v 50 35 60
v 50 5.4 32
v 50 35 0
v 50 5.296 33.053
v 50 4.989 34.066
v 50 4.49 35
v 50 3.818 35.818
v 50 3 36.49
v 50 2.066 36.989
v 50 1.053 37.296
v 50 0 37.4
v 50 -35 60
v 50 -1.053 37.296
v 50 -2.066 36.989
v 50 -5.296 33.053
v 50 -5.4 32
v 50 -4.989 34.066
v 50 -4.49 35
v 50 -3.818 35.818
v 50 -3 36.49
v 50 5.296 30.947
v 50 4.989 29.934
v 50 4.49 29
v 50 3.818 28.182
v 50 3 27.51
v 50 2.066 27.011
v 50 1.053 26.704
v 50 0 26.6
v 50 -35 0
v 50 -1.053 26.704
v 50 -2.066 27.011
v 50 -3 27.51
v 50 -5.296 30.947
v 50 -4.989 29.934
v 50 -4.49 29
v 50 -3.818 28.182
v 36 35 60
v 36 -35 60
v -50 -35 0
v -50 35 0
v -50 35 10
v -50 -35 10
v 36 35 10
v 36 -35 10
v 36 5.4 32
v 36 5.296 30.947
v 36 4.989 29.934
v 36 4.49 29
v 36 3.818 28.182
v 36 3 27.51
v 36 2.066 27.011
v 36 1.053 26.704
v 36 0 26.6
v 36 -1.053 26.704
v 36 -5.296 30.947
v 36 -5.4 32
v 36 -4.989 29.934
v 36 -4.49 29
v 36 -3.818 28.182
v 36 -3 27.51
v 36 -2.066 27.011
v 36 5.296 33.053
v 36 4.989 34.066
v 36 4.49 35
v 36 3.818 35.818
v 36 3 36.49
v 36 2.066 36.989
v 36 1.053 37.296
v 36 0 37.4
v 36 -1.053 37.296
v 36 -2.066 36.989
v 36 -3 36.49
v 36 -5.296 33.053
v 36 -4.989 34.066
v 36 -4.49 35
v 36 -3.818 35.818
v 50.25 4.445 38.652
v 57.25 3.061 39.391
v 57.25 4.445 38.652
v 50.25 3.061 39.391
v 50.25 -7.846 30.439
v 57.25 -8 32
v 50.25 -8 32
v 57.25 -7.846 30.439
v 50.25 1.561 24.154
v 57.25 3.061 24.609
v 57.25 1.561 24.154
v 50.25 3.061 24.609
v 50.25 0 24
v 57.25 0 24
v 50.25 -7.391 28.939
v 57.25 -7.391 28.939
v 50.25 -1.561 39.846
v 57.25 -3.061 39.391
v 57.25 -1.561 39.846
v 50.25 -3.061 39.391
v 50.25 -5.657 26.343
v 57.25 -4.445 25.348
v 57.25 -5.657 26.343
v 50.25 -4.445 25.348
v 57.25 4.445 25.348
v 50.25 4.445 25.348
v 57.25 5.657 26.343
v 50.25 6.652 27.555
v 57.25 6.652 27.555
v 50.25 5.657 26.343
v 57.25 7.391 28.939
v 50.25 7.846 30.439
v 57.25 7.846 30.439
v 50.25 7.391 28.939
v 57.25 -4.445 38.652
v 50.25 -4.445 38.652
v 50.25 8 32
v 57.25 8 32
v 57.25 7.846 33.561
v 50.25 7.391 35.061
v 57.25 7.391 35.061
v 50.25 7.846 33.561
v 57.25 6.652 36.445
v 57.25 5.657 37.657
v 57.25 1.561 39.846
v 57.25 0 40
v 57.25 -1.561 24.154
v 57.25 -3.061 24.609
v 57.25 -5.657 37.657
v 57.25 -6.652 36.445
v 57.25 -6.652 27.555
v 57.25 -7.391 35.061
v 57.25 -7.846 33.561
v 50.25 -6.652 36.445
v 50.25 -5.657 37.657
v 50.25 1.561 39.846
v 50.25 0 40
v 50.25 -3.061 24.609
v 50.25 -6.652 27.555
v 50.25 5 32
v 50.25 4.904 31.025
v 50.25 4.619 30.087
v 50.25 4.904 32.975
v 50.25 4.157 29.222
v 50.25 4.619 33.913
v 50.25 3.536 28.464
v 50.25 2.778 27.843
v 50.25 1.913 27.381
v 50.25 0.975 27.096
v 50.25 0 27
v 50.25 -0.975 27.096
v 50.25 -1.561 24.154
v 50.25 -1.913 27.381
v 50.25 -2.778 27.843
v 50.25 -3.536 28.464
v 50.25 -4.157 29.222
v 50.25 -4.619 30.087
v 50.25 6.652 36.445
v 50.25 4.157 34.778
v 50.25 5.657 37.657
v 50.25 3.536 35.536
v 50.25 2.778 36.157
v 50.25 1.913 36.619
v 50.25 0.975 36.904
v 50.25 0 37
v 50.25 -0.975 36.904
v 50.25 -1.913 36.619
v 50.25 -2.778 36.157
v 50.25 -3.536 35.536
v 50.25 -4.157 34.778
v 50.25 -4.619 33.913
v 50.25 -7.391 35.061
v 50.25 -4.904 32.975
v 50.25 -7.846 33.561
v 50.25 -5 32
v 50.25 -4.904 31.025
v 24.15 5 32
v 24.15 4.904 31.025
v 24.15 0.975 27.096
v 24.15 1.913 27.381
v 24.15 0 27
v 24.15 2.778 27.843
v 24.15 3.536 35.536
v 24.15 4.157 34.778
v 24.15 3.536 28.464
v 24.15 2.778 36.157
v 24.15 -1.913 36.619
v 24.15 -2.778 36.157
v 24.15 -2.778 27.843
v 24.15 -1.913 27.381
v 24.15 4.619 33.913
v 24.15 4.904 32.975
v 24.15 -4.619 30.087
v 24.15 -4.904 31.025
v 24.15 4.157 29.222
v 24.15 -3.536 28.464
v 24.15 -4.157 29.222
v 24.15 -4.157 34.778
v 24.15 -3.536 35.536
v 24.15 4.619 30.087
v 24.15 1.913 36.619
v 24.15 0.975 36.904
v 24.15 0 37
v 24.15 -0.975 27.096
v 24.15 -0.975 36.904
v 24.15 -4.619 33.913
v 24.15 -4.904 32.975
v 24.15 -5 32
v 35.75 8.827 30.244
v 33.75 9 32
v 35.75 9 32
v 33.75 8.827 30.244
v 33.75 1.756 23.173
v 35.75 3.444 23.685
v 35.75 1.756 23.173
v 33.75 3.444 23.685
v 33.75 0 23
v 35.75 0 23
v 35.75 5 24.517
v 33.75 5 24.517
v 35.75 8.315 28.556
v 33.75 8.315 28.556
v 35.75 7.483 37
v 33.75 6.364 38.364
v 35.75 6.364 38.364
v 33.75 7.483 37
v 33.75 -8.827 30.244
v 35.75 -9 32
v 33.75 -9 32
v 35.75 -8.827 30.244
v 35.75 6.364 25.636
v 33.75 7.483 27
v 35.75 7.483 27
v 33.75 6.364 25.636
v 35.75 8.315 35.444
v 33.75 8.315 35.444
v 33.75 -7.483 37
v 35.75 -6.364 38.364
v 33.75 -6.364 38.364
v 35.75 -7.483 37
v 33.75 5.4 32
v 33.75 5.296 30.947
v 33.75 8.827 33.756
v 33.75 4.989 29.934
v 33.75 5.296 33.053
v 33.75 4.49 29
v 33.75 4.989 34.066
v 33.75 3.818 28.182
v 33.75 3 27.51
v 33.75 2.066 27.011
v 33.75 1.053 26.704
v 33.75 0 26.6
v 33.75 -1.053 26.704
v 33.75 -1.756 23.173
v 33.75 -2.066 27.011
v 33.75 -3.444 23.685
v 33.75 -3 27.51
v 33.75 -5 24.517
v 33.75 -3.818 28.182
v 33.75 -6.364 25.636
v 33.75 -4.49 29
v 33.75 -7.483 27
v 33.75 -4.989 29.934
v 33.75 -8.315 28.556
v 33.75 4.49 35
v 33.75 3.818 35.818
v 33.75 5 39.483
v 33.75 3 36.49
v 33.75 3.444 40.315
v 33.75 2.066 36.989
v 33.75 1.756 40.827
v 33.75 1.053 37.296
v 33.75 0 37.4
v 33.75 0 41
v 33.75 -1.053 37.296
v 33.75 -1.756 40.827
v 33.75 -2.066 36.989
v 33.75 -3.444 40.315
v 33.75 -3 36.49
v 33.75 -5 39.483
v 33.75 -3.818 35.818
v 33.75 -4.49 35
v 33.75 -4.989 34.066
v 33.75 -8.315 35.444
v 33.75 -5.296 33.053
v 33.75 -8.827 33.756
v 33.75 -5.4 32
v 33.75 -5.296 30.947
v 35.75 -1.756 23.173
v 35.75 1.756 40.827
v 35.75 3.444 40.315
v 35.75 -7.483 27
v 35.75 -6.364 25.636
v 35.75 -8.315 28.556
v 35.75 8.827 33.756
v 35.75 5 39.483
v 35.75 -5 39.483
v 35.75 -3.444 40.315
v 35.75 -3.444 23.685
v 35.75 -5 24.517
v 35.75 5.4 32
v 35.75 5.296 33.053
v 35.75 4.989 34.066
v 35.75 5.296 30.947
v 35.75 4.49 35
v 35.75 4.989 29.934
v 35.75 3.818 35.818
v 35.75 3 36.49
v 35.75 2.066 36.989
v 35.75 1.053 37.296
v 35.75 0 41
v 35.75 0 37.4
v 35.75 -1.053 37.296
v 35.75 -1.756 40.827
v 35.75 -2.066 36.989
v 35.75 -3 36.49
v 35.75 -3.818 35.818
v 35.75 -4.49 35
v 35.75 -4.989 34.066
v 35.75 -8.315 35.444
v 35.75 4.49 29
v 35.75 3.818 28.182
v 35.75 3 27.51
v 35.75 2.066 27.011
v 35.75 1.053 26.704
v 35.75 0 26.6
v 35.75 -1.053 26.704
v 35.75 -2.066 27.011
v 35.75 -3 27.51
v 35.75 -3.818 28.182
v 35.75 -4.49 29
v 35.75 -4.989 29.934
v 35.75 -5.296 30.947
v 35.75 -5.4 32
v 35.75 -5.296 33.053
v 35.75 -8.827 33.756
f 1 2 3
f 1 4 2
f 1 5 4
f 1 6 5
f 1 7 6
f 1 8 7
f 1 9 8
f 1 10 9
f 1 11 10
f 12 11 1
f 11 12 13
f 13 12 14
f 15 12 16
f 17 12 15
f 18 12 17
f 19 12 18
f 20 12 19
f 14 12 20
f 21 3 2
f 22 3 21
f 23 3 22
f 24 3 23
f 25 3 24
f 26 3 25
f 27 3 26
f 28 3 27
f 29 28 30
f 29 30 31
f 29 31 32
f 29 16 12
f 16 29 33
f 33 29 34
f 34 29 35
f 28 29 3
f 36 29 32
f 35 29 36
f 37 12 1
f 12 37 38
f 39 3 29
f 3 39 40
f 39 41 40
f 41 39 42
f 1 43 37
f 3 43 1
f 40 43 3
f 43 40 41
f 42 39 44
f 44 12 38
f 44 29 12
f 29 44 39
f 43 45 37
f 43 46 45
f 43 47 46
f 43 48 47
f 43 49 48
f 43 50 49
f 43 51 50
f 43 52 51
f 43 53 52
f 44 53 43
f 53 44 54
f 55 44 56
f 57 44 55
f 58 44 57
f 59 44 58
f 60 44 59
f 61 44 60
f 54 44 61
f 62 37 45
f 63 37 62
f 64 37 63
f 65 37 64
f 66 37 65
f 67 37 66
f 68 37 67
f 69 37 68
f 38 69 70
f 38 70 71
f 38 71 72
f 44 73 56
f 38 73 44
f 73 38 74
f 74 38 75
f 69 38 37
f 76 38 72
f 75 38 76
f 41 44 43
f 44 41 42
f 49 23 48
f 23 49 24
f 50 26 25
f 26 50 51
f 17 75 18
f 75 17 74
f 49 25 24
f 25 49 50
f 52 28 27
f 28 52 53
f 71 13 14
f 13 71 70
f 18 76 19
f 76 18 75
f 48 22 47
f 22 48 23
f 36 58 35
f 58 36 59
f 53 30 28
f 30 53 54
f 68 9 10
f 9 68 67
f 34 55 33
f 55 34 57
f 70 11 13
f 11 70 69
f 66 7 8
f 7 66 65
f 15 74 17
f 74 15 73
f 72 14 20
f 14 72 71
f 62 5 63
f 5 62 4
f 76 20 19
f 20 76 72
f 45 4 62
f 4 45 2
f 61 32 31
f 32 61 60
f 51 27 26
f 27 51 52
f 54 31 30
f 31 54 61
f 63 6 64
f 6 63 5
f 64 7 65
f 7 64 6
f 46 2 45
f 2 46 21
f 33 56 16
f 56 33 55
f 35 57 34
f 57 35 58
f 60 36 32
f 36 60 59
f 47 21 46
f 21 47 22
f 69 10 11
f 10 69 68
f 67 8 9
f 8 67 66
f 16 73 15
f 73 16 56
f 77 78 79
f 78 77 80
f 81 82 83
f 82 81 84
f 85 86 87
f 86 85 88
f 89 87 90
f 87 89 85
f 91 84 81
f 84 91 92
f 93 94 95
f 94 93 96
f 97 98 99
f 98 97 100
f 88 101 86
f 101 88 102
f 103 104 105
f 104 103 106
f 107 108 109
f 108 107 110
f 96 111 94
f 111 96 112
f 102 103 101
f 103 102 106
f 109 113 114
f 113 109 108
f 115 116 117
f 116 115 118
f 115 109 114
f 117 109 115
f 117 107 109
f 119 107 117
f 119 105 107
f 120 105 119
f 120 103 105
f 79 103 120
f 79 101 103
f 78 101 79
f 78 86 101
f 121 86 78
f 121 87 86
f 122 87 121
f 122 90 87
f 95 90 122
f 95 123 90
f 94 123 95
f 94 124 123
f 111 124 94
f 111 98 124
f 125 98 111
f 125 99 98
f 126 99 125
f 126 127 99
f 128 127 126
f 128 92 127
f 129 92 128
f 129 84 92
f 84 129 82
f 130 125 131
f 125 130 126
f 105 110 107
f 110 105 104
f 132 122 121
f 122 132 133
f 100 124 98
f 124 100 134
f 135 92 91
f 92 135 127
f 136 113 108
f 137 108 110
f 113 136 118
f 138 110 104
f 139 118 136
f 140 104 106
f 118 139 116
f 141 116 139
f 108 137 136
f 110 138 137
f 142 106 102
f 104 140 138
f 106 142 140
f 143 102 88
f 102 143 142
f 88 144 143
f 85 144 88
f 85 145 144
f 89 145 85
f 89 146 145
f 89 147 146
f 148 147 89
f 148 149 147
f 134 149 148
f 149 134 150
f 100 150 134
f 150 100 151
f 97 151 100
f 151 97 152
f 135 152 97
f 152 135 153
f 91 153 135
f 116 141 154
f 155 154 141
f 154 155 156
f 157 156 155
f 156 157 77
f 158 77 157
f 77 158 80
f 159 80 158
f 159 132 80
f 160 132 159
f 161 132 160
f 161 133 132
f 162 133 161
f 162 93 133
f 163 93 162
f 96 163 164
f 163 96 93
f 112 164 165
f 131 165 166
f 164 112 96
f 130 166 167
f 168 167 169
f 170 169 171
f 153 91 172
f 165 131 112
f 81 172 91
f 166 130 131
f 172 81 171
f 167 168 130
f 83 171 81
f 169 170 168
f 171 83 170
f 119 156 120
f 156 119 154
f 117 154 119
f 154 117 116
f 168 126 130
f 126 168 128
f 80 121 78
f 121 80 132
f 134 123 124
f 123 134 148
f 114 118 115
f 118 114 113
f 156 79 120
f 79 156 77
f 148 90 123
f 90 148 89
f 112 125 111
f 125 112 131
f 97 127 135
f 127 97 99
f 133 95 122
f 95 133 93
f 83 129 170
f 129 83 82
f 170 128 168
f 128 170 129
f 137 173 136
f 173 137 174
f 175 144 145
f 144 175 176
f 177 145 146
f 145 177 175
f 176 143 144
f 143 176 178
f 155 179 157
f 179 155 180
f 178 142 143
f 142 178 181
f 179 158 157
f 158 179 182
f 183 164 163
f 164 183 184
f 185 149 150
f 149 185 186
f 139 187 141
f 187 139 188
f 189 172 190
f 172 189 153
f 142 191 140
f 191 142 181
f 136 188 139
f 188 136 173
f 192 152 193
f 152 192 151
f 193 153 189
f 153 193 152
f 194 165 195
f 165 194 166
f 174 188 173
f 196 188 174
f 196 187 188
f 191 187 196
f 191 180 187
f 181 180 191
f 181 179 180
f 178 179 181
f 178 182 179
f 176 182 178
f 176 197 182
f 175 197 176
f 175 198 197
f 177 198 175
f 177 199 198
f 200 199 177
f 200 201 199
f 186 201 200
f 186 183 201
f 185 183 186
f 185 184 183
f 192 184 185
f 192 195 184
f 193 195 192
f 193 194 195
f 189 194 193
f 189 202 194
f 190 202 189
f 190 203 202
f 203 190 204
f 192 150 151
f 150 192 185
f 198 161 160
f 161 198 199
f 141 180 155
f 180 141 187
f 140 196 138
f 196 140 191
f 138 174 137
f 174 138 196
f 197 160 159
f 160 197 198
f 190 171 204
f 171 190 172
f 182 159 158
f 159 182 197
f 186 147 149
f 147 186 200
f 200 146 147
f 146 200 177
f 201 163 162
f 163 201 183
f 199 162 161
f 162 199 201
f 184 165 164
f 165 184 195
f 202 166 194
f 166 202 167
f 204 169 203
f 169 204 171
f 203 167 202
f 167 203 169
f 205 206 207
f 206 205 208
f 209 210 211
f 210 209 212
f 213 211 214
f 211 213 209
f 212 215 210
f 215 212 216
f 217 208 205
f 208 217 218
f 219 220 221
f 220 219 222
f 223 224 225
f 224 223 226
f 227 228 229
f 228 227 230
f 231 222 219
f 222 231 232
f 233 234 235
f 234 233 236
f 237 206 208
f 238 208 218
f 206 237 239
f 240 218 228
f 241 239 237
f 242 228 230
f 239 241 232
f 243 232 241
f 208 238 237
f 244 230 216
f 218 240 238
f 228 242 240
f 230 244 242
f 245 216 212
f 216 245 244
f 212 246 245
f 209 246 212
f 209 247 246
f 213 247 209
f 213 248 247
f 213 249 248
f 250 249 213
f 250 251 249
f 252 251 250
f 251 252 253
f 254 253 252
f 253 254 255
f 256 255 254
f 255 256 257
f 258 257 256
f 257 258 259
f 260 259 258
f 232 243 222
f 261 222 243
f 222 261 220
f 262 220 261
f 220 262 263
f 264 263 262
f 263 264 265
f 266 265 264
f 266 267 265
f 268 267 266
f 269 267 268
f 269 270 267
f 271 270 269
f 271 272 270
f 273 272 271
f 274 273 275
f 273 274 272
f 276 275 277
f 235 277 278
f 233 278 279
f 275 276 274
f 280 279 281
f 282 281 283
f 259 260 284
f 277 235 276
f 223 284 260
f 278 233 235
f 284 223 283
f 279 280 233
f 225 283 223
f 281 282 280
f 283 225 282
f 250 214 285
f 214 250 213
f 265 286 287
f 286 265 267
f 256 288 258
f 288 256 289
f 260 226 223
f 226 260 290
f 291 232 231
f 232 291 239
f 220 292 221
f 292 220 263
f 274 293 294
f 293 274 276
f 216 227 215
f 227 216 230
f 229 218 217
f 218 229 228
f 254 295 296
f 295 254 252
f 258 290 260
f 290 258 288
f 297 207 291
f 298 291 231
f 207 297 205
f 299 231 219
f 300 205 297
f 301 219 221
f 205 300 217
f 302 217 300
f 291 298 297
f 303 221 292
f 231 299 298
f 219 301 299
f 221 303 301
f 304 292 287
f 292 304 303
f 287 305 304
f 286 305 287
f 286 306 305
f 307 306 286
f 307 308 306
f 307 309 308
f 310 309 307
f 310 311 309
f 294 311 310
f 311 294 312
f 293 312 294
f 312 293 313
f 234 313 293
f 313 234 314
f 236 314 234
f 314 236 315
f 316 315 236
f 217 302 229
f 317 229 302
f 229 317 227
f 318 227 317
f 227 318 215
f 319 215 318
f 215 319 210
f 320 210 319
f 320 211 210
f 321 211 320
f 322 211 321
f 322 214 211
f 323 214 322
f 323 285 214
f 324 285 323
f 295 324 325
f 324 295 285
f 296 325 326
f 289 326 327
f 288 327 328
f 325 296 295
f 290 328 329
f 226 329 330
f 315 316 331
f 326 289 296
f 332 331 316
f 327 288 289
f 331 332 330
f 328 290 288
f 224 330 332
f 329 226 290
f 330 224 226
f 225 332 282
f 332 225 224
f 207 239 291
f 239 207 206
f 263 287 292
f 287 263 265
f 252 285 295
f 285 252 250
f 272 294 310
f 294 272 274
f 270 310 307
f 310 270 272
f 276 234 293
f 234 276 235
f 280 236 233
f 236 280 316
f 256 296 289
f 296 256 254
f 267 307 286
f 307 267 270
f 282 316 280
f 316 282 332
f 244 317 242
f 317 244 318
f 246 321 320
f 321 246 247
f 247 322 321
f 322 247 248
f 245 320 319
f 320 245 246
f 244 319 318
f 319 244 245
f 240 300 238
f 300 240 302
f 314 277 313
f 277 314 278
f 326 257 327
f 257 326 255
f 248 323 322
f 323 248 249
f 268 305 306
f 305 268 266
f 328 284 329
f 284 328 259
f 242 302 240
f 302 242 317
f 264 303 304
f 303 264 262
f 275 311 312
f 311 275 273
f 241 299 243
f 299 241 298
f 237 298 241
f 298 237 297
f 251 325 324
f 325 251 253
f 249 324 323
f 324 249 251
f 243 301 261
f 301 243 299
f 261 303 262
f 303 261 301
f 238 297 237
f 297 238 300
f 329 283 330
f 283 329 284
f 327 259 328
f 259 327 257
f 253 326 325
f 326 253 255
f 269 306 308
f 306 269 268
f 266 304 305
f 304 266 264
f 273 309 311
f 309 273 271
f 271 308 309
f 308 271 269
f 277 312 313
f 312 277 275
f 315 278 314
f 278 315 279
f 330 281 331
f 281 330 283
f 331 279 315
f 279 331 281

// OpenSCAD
$fn = 32;

// ------------------------------------------------------------------------
// Bolted bracket: 100 x 70 mm bracket with 1 bolt joints
// Every part is its own module, assembly() places them once.
// ------------------------------------------------------------------------

// --- part 1 ---
module bracket() {
  difference() {
    translate([-50, -35, 0]) cube([100, 70, 60]);
    translate([-51, -36, 10]) cube([87, 72, 51]);
    translate([43, 0, 32]) rotate([0, 90, 0]) cylinder(h = 16, d = 10.8, center = true);
  }
}

// --- part 2 ---
module bolt() {
  cylinder(h = 7, d = 16);
  translate([0, 0, -26.1]) cylinder(h = 26.1, d = 10);
}

// --- part 3 ---
module washer() {
  difference() {
      translate([0, 0, 0]) cylinder(h = 2, d = 18);
      translate([0, 0, -1]) cylinder(h = 4, d = 10.8);
    }
}

// --- assembly ---
module assembly() {
  translate([0, 0, 0]) rotate([0, 0, 0]) bracket();
  translate([50.25, 0, 32]) rotate([0, 90, 0]) bolt();
  translate([33.75, 0, 32]) rotate([0, 90, 0]) washer();
}

assembly();
